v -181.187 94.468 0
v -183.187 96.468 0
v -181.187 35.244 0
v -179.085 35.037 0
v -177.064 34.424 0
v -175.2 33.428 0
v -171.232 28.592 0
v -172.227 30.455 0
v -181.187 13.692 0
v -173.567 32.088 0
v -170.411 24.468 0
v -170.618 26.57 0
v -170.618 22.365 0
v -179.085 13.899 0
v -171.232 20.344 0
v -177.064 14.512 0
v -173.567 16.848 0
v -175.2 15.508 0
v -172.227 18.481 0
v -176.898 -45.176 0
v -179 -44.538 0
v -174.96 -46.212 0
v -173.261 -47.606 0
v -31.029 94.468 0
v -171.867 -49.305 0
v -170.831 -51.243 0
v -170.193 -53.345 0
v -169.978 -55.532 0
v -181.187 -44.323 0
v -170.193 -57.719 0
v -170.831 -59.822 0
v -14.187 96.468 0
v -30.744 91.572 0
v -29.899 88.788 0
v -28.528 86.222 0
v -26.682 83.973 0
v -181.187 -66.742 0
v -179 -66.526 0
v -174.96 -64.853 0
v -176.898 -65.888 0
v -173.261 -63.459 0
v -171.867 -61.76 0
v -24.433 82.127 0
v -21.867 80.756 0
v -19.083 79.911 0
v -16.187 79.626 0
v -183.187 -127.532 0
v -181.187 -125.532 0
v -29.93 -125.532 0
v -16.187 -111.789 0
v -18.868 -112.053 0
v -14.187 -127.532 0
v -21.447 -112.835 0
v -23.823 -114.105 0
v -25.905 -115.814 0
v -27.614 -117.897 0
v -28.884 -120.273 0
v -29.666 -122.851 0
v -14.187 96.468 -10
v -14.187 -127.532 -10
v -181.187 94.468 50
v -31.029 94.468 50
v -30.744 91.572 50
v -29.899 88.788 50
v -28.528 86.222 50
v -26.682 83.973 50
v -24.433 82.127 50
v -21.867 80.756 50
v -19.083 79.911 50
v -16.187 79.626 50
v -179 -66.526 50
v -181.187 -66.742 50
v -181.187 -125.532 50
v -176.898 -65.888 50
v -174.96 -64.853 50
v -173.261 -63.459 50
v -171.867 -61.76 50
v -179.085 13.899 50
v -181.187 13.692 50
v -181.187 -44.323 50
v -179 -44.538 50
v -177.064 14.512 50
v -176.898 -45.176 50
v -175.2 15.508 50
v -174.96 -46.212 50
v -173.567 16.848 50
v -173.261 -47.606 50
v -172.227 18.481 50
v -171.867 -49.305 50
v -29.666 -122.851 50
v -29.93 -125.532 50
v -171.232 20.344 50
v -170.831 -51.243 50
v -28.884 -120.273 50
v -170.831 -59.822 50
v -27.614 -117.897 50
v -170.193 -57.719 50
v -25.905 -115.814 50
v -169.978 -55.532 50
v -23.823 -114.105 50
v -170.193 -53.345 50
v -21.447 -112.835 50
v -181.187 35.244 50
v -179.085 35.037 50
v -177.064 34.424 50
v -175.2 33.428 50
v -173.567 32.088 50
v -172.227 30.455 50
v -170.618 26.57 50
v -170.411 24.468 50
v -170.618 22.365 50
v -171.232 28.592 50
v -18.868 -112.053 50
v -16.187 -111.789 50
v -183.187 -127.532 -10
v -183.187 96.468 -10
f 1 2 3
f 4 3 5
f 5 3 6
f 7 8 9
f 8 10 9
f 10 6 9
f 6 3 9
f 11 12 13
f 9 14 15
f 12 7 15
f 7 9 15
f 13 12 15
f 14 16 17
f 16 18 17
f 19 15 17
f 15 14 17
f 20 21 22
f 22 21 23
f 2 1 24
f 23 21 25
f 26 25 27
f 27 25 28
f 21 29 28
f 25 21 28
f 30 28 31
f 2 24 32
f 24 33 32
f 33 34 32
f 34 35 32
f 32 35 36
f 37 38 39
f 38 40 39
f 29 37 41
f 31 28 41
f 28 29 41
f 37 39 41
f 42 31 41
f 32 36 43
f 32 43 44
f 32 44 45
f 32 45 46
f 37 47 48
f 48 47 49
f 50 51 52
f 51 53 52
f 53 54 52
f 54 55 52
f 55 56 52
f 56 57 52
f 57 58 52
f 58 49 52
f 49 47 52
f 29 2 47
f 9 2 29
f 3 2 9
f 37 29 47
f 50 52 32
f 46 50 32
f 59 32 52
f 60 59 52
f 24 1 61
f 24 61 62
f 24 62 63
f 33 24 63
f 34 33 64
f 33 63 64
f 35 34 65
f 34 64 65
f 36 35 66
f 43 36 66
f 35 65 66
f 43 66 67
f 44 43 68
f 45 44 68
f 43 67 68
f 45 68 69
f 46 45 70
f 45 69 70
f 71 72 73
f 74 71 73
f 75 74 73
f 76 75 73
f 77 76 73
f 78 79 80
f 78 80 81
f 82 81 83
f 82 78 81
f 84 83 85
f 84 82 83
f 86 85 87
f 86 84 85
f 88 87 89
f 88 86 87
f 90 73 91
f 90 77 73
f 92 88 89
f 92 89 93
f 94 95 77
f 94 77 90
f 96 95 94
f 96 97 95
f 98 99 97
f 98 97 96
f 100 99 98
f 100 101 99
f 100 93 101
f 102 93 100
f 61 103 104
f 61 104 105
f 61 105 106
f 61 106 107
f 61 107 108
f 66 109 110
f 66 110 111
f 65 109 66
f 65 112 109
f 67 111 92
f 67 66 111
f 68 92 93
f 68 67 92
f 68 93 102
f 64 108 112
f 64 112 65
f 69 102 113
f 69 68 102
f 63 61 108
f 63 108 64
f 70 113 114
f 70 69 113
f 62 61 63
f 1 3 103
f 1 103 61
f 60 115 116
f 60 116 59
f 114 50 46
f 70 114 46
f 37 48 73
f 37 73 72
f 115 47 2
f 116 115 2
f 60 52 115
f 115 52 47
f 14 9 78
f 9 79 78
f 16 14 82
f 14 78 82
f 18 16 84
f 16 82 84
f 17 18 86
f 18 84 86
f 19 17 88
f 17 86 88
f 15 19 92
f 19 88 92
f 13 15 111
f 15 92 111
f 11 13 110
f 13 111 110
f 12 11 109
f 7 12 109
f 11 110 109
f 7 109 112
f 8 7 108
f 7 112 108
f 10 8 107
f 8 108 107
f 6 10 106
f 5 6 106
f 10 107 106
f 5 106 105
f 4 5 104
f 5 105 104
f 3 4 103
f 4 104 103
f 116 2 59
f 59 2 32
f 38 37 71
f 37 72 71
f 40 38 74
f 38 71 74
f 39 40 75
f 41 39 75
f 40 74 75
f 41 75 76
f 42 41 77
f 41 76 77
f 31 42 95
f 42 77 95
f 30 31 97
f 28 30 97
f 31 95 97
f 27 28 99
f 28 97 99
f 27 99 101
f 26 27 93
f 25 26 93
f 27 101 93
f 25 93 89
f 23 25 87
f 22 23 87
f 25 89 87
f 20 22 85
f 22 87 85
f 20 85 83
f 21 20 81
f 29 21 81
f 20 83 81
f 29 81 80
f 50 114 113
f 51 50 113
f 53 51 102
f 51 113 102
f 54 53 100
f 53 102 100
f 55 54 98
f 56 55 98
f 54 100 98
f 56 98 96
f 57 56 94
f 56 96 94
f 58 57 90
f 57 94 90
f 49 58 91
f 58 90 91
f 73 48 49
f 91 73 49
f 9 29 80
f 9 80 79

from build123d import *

# Parameters (mm, degrees)
F0_W     = 165
F0_H     = 220
F1_DEPTH = 50
F3_DEPTH = 50
F4_R     = 10.776099
F4_R_2   = 11.209408
F5_DEPTH = 50
F7_DEPTH = 10


with BuildPart() as f1:
    # F0 (on Top) → F1 (new body)
    with BuildSketch(Plane.XY):
        with Locations((-98.687344, -15.532274)):
            Rectangle(F0_W, F0_H)
    extrude(amount=F1_DEPTH)

    # F2 (on face) → F3 (cut)
    with BuildSketch(Plane.XY.offset(50)):
        with BuildLine():
            Line((-16.187344, -125.532274), (-16.187344, -111.789186))
            ThreePointArc((-16.187344, -111.789186), (-25.905174, -115.814443), (-29.930431, -125.532274))
            Line((-29.930431, -125.532274), (-16.187344, -125.532274))
        make_face()
        with BuildLine():
            Line((-16.187344, 94.467726), (-31.029011, 94.467726))
            ThreePointArc((-31.029011, 94.467726), (-26.681987, 83.973083), (-16.187344, 79.626059))
            Line((-16.187344, 79.626059), (-16.187344, 94.467726))
        make_face()
        with BuildLine():
            ThreePointArc((-2.444256, -125.532274), (-6.469513, -115.814443), (-16.187344, -111.789186))
            Line((-16.187344, -111.789186), (-16.187344, -125.532274))
            Line((-16.187344, -125.532274), (-29.930431, -125.532274))
            ThreePointArc((-29.930431, -125.532274), (-16.187344, -139.275361), (-2.444256, -125.532274))
        make_face()
        with BuildLine():
            ThreePointArc((-16.187344, 79.626059), (-5.6927, 83.973083), (-1.345676, 94.467726))
            ThreePointArc((-1.345676, 94.467726), (-16.187344, 109.309394), (-31.029011, 94.467726))
            Line((-31.029011, 94.467726), (-16.187344, 94.467726))
            Line((-16.187344, 94.467726), (-16.187344, 79.626059))
        make_face()
    extrude(amount=-F3_DEPTH, mode=Mode.SUBTRACT)

    # F4 (on face) → F5 (cut)
    with BuildSketch(Plane.XY.offset(50)):
        with Locations((-181.187344, 24.467726)):
            Circle(F4_R)
        with Locations((-181.187344, -55.532274)):
            Circle(F4_R_2)
    extrude(amount=-F5_DEPTH, mode=Mode.SUBTRACT)

    # F6 (on face) → F7 (join)
    with BuildSketch(Plane(origin=(0, 0, 0), x_dir=(1, 0, 0), z_dir=(0, 0, -1))):
        Polygon((-14.187344, 127.532274), (-181.187344, 127.532274), (-183.187344, 127.532274), (-183.187344, 125.532274), (-183.187344, -96.467726), (-159.191355, -96.467726), (-14.187344, -96.467726), (-14.187344, -65.397188), align=None)
    extrude(amount=F7_DEPTH)


solid = f1.part
